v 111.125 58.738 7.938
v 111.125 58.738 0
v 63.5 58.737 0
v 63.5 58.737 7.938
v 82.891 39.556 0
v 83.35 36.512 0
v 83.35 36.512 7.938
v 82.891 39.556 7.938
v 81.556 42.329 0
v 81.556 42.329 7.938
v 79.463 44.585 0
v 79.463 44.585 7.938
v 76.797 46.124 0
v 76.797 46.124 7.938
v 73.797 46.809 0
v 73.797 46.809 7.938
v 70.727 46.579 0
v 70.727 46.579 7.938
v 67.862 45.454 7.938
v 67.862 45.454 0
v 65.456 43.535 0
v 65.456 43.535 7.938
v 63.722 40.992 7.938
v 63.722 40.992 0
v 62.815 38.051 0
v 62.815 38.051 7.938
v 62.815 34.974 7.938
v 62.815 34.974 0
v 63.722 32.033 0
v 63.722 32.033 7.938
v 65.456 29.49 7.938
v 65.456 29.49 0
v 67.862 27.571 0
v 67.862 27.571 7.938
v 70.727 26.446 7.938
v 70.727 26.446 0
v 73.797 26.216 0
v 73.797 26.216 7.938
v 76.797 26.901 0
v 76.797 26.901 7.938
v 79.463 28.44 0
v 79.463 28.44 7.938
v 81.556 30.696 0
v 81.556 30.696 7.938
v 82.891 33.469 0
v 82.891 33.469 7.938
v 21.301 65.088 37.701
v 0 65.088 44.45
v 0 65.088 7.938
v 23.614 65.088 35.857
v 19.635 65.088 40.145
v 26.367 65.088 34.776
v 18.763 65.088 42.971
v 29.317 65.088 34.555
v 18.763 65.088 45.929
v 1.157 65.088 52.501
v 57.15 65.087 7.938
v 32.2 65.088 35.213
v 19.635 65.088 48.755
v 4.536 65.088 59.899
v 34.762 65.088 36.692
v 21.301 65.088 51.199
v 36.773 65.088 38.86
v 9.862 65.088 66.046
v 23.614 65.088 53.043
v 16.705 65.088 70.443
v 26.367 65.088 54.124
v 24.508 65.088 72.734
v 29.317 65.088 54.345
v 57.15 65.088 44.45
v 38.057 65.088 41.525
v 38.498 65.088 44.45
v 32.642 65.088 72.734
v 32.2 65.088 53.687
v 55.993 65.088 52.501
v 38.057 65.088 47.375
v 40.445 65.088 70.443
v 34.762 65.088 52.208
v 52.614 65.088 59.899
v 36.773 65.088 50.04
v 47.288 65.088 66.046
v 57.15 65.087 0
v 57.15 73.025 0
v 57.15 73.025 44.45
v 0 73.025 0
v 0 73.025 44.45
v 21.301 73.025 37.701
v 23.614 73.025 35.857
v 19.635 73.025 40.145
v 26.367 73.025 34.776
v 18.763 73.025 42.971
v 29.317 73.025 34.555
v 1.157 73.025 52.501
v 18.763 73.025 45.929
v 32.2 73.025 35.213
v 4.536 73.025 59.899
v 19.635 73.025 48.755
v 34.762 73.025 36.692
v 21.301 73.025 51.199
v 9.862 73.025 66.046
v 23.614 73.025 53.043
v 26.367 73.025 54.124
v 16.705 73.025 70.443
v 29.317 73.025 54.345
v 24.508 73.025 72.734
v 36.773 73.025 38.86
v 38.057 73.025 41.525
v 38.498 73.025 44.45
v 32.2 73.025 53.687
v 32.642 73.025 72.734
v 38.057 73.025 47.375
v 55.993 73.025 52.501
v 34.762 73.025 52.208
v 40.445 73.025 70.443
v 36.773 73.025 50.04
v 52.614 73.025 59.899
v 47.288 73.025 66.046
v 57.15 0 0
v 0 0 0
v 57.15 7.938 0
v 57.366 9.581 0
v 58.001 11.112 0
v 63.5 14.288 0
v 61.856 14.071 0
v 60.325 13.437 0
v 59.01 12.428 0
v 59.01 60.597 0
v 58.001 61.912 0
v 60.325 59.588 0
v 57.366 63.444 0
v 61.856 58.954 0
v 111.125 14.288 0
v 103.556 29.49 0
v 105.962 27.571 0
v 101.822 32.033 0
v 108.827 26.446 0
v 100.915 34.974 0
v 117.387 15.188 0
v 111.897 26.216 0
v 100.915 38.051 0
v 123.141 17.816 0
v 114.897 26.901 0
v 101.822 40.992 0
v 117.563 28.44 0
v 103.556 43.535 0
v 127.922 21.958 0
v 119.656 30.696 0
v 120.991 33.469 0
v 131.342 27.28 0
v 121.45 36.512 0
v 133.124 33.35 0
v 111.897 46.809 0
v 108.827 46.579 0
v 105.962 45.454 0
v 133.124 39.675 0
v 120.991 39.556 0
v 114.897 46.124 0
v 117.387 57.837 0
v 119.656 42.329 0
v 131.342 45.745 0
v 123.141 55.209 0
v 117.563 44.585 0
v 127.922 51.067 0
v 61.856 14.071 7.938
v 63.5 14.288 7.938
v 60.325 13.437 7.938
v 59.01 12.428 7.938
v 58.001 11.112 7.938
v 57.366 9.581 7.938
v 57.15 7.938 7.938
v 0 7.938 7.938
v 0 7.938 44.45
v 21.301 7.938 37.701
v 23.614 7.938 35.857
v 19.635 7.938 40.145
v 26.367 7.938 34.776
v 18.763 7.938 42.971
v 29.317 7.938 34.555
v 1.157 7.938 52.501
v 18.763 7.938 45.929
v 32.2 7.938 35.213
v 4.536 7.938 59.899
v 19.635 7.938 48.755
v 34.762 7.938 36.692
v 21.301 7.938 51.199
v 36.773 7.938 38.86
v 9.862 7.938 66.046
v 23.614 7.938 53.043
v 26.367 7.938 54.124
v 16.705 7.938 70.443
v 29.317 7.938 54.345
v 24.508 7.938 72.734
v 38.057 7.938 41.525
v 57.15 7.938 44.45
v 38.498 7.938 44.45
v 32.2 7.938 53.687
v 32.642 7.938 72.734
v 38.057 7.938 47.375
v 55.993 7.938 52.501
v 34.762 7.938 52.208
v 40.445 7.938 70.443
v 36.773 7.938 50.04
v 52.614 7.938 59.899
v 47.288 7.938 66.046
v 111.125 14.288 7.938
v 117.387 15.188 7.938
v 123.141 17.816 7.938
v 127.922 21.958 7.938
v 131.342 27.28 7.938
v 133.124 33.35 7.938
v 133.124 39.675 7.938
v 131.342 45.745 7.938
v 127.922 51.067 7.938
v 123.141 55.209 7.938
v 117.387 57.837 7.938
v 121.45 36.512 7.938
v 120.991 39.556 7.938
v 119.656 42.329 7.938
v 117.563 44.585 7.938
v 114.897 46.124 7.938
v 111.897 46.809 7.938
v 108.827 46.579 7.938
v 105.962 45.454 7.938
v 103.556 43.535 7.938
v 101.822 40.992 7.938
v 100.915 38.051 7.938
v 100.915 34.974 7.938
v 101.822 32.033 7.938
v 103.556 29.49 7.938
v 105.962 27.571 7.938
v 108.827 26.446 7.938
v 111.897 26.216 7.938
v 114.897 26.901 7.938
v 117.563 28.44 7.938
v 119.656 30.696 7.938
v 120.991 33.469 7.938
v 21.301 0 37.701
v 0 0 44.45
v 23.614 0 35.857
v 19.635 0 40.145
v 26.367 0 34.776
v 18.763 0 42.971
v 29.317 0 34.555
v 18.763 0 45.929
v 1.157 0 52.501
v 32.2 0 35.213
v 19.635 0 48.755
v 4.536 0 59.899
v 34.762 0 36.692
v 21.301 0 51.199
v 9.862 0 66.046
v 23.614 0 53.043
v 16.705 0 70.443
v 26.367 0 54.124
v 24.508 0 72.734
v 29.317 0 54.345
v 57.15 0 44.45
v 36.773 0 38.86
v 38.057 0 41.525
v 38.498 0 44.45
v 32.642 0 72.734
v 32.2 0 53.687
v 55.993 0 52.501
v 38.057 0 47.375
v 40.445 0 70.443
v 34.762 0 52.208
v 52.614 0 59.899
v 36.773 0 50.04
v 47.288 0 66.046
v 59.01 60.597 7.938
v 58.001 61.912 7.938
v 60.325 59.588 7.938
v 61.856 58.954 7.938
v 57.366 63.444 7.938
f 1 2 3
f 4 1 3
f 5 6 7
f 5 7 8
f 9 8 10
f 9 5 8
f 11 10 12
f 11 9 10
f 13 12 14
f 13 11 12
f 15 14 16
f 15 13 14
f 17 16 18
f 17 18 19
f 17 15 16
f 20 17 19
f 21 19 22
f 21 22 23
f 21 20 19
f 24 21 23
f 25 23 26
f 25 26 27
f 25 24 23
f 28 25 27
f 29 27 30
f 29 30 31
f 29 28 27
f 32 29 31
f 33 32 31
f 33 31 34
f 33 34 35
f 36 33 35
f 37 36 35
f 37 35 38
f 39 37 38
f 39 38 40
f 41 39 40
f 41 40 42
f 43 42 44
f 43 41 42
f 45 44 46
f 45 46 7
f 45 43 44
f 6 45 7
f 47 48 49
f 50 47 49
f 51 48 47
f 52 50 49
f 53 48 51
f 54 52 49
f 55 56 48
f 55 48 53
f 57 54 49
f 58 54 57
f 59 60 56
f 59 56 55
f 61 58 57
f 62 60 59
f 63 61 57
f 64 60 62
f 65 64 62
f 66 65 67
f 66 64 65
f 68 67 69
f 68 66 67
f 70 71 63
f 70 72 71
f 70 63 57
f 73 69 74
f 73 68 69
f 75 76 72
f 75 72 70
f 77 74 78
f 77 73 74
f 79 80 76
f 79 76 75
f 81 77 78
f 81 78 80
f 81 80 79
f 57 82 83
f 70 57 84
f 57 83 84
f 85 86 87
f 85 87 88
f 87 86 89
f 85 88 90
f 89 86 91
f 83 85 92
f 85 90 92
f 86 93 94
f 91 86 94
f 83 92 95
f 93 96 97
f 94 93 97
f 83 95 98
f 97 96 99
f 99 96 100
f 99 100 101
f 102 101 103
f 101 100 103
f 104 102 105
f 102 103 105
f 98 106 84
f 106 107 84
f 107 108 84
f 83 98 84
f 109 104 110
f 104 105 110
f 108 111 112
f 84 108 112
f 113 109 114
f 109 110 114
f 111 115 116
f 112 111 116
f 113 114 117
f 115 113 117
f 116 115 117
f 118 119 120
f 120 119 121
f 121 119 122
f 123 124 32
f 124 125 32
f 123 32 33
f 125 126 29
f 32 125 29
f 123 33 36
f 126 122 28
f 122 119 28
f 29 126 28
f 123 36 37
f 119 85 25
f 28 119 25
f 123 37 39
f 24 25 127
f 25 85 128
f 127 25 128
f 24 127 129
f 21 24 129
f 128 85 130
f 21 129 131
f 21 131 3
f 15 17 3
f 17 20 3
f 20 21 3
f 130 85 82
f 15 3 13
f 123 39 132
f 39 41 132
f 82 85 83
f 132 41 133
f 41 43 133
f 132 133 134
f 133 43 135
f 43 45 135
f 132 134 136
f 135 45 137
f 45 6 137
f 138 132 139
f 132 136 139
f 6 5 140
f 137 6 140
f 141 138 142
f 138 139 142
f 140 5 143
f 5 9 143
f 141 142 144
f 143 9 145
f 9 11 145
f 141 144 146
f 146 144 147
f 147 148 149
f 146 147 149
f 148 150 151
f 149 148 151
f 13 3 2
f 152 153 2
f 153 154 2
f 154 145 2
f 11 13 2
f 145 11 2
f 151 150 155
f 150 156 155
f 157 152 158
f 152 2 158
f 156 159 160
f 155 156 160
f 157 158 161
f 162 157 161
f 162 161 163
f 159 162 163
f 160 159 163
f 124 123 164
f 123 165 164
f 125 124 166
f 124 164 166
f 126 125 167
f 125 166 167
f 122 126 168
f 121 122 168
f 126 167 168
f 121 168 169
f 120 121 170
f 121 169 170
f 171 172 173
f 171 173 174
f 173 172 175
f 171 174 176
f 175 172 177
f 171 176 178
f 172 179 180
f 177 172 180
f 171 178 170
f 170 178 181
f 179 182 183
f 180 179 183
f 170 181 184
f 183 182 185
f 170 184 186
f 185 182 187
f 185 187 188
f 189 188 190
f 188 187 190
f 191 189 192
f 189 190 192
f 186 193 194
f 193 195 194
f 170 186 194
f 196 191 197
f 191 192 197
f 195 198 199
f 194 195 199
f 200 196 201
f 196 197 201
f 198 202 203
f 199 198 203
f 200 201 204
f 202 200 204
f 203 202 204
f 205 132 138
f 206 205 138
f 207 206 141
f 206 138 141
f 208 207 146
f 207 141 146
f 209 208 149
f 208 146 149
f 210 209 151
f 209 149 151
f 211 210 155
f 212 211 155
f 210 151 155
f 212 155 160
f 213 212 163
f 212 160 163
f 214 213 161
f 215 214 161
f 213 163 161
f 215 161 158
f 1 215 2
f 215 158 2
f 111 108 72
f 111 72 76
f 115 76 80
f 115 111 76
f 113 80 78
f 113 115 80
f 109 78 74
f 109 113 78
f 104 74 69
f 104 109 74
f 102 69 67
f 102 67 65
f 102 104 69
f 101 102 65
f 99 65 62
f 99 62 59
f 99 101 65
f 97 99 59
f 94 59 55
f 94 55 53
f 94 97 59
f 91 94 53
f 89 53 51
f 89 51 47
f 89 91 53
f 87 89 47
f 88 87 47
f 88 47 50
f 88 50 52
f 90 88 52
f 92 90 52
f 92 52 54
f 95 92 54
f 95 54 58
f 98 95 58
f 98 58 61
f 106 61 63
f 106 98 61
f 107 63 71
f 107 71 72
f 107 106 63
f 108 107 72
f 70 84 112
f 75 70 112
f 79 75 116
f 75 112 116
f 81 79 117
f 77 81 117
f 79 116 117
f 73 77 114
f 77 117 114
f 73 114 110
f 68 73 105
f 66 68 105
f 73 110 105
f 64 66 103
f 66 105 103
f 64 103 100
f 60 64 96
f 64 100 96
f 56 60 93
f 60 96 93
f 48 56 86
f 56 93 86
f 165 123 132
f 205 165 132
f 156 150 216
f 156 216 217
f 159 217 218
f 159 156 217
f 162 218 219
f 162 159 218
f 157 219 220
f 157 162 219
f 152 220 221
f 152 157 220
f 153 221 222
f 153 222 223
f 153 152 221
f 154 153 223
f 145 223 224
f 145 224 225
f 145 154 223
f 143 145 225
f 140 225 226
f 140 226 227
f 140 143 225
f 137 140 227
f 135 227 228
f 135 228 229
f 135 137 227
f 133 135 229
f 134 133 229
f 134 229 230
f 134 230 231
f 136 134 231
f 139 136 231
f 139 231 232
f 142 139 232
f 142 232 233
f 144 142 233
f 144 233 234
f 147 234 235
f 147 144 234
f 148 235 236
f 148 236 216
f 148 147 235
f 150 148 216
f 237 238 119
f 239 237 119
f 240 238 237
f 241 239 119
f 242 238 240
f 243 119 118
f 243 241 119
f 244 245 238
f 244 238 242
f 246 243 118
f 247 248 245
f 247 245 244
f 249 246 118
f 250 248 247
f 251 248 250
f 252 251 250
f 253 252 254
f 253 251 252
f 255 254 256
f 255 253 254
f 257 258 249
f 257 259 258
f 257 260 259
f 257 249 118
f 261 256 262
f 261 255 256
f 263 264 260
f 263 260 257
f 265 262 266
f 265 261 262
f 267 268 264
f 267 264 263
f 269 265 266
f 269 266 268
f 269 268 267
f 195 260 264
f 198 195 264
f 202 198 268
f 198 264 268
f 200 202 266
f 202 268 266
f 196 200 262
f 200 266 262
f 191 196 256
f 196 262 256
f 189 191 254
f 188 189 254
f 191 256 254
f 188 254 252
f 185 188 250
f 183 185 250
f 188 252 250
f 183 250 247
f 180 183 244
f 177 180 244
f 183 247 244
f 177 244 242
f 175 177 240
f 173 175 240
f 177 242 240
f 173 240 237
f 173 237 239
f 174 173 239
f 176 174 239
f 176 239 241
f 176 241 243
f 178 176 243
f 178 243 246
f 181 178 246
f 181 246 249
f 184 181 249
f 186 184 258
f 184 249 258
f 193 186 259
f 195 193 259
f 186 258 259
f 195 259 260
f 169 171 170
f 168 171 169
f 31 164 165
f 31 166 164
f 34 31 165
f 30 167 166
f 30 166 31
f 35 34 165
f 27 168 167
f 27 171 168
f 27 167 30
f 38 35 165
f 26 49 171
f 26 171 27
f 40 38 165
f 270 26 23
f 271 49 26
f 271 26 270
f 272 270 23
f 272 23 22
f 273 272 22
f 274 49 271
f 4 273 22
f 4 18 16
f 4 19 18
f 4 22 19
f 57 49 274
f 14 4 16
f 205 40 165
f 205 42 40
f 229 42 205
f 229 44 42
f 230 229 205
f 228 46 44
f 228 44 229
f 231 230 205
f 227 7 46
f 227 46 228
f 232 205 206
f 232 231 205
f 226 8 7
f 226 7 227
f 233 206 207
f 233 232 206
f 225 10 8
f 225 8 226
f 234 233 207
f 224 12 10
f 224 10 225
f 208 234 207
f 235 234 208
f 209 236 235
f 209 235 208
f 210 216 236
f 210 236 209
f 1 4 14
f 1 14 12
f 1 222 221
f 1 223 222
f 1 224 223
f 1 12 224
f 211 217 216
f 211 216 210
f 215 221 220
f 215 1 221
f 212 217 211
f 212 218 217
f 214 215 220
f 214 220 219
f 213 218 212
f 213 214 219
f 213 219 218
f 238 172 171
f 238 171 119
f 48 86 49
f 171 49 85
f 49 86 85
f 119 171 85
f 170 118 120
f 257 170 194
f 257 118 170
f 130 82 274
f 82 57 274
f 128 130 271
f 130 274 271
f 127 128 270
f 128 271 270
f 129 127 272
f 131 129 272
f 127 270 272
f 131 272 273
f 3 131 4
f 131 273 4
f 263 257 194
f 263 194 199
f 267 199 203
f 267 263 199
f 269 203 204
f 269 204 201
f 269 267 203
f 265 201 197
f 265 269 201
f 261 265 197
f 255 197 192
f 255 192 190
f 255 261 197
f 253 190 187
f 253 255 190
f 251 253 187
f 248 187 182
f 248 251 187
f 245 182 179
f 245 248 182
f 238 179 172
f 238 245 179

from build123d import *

# Parameters (mm, degrees)
F0_R     = 10.3251
F1_DEPTH = 7.9375
F2_R     = 9.92251
F3_DEPTH = 7.9375
F4_R     = 6.35


# Not quite as in the source:
# - a pattern or mirror of a feature is missing from the dataset's text; its kind, count and spacing are read off the source's solid


with BuildPart() as f1:
    # F0 (on Top) → F1 (new body)
    with BuildSketch(Plane.XY):
        with BuildLine():
            Line((0, 73.025), (0, 0))
            Line((0, 0), (57.15, 0))
            Line((57.15, 0), (57.15, 14.2875))
            Line((57.15, 14.2875), (111.125, 14.2875))
            ThreePointArc((111.125, 14.2875), (133.35, 36.5125), (111.125, 58.7375))
            Line((111.125, 58.7375), (57.15, 58.7375))
            Line((57.15, 58.7375), (57.15, 73.025))
            Line((57.15, 73.025), (0, 73.025))
        make_face()
        with Locations((73.025, 36.5125)):
            Circle(F0_R, mode=Mode.SUBTRACT)
        with Locations((111.125, 36.5125)):
            Circle(F0_R, mode=Mode.SUBTRACT)
    extrude(amount=F1_DEPTH)

    # F2 (on Front) → F3 (join)
    with BuildSketch(Plane.XZ):
        with BuildLine():
            Line((0, 44.45), (0, 0))
            Line((0, 0), (57.15, 0))
            Line((57.15, 0), (57.15, 44.45))
            ThreePointArc((57.15, 44.45), (28.575, 73.025), (0, 44.45))
        make_face()
        with Locations((28.575, 44.45)):
            Circle(F2_R, mode=Mode.SUBTRACT)
    f3 = extrude(amount=-F3_DEPTH)

    # F3_copies: F3 across plane
    add(f3.mirror(Plane.ZX.offset(36.5125)))

    # F4
    f4_edges = [f1.edges().sort_by_distance(p)[0] for p in [
        (57.15, 14.2875, 3.96875),
        (57.15, 58.7375, 3.96875),
    ]]
    fillet(f4_edges, radius=F4_R)


solid = f1.part
